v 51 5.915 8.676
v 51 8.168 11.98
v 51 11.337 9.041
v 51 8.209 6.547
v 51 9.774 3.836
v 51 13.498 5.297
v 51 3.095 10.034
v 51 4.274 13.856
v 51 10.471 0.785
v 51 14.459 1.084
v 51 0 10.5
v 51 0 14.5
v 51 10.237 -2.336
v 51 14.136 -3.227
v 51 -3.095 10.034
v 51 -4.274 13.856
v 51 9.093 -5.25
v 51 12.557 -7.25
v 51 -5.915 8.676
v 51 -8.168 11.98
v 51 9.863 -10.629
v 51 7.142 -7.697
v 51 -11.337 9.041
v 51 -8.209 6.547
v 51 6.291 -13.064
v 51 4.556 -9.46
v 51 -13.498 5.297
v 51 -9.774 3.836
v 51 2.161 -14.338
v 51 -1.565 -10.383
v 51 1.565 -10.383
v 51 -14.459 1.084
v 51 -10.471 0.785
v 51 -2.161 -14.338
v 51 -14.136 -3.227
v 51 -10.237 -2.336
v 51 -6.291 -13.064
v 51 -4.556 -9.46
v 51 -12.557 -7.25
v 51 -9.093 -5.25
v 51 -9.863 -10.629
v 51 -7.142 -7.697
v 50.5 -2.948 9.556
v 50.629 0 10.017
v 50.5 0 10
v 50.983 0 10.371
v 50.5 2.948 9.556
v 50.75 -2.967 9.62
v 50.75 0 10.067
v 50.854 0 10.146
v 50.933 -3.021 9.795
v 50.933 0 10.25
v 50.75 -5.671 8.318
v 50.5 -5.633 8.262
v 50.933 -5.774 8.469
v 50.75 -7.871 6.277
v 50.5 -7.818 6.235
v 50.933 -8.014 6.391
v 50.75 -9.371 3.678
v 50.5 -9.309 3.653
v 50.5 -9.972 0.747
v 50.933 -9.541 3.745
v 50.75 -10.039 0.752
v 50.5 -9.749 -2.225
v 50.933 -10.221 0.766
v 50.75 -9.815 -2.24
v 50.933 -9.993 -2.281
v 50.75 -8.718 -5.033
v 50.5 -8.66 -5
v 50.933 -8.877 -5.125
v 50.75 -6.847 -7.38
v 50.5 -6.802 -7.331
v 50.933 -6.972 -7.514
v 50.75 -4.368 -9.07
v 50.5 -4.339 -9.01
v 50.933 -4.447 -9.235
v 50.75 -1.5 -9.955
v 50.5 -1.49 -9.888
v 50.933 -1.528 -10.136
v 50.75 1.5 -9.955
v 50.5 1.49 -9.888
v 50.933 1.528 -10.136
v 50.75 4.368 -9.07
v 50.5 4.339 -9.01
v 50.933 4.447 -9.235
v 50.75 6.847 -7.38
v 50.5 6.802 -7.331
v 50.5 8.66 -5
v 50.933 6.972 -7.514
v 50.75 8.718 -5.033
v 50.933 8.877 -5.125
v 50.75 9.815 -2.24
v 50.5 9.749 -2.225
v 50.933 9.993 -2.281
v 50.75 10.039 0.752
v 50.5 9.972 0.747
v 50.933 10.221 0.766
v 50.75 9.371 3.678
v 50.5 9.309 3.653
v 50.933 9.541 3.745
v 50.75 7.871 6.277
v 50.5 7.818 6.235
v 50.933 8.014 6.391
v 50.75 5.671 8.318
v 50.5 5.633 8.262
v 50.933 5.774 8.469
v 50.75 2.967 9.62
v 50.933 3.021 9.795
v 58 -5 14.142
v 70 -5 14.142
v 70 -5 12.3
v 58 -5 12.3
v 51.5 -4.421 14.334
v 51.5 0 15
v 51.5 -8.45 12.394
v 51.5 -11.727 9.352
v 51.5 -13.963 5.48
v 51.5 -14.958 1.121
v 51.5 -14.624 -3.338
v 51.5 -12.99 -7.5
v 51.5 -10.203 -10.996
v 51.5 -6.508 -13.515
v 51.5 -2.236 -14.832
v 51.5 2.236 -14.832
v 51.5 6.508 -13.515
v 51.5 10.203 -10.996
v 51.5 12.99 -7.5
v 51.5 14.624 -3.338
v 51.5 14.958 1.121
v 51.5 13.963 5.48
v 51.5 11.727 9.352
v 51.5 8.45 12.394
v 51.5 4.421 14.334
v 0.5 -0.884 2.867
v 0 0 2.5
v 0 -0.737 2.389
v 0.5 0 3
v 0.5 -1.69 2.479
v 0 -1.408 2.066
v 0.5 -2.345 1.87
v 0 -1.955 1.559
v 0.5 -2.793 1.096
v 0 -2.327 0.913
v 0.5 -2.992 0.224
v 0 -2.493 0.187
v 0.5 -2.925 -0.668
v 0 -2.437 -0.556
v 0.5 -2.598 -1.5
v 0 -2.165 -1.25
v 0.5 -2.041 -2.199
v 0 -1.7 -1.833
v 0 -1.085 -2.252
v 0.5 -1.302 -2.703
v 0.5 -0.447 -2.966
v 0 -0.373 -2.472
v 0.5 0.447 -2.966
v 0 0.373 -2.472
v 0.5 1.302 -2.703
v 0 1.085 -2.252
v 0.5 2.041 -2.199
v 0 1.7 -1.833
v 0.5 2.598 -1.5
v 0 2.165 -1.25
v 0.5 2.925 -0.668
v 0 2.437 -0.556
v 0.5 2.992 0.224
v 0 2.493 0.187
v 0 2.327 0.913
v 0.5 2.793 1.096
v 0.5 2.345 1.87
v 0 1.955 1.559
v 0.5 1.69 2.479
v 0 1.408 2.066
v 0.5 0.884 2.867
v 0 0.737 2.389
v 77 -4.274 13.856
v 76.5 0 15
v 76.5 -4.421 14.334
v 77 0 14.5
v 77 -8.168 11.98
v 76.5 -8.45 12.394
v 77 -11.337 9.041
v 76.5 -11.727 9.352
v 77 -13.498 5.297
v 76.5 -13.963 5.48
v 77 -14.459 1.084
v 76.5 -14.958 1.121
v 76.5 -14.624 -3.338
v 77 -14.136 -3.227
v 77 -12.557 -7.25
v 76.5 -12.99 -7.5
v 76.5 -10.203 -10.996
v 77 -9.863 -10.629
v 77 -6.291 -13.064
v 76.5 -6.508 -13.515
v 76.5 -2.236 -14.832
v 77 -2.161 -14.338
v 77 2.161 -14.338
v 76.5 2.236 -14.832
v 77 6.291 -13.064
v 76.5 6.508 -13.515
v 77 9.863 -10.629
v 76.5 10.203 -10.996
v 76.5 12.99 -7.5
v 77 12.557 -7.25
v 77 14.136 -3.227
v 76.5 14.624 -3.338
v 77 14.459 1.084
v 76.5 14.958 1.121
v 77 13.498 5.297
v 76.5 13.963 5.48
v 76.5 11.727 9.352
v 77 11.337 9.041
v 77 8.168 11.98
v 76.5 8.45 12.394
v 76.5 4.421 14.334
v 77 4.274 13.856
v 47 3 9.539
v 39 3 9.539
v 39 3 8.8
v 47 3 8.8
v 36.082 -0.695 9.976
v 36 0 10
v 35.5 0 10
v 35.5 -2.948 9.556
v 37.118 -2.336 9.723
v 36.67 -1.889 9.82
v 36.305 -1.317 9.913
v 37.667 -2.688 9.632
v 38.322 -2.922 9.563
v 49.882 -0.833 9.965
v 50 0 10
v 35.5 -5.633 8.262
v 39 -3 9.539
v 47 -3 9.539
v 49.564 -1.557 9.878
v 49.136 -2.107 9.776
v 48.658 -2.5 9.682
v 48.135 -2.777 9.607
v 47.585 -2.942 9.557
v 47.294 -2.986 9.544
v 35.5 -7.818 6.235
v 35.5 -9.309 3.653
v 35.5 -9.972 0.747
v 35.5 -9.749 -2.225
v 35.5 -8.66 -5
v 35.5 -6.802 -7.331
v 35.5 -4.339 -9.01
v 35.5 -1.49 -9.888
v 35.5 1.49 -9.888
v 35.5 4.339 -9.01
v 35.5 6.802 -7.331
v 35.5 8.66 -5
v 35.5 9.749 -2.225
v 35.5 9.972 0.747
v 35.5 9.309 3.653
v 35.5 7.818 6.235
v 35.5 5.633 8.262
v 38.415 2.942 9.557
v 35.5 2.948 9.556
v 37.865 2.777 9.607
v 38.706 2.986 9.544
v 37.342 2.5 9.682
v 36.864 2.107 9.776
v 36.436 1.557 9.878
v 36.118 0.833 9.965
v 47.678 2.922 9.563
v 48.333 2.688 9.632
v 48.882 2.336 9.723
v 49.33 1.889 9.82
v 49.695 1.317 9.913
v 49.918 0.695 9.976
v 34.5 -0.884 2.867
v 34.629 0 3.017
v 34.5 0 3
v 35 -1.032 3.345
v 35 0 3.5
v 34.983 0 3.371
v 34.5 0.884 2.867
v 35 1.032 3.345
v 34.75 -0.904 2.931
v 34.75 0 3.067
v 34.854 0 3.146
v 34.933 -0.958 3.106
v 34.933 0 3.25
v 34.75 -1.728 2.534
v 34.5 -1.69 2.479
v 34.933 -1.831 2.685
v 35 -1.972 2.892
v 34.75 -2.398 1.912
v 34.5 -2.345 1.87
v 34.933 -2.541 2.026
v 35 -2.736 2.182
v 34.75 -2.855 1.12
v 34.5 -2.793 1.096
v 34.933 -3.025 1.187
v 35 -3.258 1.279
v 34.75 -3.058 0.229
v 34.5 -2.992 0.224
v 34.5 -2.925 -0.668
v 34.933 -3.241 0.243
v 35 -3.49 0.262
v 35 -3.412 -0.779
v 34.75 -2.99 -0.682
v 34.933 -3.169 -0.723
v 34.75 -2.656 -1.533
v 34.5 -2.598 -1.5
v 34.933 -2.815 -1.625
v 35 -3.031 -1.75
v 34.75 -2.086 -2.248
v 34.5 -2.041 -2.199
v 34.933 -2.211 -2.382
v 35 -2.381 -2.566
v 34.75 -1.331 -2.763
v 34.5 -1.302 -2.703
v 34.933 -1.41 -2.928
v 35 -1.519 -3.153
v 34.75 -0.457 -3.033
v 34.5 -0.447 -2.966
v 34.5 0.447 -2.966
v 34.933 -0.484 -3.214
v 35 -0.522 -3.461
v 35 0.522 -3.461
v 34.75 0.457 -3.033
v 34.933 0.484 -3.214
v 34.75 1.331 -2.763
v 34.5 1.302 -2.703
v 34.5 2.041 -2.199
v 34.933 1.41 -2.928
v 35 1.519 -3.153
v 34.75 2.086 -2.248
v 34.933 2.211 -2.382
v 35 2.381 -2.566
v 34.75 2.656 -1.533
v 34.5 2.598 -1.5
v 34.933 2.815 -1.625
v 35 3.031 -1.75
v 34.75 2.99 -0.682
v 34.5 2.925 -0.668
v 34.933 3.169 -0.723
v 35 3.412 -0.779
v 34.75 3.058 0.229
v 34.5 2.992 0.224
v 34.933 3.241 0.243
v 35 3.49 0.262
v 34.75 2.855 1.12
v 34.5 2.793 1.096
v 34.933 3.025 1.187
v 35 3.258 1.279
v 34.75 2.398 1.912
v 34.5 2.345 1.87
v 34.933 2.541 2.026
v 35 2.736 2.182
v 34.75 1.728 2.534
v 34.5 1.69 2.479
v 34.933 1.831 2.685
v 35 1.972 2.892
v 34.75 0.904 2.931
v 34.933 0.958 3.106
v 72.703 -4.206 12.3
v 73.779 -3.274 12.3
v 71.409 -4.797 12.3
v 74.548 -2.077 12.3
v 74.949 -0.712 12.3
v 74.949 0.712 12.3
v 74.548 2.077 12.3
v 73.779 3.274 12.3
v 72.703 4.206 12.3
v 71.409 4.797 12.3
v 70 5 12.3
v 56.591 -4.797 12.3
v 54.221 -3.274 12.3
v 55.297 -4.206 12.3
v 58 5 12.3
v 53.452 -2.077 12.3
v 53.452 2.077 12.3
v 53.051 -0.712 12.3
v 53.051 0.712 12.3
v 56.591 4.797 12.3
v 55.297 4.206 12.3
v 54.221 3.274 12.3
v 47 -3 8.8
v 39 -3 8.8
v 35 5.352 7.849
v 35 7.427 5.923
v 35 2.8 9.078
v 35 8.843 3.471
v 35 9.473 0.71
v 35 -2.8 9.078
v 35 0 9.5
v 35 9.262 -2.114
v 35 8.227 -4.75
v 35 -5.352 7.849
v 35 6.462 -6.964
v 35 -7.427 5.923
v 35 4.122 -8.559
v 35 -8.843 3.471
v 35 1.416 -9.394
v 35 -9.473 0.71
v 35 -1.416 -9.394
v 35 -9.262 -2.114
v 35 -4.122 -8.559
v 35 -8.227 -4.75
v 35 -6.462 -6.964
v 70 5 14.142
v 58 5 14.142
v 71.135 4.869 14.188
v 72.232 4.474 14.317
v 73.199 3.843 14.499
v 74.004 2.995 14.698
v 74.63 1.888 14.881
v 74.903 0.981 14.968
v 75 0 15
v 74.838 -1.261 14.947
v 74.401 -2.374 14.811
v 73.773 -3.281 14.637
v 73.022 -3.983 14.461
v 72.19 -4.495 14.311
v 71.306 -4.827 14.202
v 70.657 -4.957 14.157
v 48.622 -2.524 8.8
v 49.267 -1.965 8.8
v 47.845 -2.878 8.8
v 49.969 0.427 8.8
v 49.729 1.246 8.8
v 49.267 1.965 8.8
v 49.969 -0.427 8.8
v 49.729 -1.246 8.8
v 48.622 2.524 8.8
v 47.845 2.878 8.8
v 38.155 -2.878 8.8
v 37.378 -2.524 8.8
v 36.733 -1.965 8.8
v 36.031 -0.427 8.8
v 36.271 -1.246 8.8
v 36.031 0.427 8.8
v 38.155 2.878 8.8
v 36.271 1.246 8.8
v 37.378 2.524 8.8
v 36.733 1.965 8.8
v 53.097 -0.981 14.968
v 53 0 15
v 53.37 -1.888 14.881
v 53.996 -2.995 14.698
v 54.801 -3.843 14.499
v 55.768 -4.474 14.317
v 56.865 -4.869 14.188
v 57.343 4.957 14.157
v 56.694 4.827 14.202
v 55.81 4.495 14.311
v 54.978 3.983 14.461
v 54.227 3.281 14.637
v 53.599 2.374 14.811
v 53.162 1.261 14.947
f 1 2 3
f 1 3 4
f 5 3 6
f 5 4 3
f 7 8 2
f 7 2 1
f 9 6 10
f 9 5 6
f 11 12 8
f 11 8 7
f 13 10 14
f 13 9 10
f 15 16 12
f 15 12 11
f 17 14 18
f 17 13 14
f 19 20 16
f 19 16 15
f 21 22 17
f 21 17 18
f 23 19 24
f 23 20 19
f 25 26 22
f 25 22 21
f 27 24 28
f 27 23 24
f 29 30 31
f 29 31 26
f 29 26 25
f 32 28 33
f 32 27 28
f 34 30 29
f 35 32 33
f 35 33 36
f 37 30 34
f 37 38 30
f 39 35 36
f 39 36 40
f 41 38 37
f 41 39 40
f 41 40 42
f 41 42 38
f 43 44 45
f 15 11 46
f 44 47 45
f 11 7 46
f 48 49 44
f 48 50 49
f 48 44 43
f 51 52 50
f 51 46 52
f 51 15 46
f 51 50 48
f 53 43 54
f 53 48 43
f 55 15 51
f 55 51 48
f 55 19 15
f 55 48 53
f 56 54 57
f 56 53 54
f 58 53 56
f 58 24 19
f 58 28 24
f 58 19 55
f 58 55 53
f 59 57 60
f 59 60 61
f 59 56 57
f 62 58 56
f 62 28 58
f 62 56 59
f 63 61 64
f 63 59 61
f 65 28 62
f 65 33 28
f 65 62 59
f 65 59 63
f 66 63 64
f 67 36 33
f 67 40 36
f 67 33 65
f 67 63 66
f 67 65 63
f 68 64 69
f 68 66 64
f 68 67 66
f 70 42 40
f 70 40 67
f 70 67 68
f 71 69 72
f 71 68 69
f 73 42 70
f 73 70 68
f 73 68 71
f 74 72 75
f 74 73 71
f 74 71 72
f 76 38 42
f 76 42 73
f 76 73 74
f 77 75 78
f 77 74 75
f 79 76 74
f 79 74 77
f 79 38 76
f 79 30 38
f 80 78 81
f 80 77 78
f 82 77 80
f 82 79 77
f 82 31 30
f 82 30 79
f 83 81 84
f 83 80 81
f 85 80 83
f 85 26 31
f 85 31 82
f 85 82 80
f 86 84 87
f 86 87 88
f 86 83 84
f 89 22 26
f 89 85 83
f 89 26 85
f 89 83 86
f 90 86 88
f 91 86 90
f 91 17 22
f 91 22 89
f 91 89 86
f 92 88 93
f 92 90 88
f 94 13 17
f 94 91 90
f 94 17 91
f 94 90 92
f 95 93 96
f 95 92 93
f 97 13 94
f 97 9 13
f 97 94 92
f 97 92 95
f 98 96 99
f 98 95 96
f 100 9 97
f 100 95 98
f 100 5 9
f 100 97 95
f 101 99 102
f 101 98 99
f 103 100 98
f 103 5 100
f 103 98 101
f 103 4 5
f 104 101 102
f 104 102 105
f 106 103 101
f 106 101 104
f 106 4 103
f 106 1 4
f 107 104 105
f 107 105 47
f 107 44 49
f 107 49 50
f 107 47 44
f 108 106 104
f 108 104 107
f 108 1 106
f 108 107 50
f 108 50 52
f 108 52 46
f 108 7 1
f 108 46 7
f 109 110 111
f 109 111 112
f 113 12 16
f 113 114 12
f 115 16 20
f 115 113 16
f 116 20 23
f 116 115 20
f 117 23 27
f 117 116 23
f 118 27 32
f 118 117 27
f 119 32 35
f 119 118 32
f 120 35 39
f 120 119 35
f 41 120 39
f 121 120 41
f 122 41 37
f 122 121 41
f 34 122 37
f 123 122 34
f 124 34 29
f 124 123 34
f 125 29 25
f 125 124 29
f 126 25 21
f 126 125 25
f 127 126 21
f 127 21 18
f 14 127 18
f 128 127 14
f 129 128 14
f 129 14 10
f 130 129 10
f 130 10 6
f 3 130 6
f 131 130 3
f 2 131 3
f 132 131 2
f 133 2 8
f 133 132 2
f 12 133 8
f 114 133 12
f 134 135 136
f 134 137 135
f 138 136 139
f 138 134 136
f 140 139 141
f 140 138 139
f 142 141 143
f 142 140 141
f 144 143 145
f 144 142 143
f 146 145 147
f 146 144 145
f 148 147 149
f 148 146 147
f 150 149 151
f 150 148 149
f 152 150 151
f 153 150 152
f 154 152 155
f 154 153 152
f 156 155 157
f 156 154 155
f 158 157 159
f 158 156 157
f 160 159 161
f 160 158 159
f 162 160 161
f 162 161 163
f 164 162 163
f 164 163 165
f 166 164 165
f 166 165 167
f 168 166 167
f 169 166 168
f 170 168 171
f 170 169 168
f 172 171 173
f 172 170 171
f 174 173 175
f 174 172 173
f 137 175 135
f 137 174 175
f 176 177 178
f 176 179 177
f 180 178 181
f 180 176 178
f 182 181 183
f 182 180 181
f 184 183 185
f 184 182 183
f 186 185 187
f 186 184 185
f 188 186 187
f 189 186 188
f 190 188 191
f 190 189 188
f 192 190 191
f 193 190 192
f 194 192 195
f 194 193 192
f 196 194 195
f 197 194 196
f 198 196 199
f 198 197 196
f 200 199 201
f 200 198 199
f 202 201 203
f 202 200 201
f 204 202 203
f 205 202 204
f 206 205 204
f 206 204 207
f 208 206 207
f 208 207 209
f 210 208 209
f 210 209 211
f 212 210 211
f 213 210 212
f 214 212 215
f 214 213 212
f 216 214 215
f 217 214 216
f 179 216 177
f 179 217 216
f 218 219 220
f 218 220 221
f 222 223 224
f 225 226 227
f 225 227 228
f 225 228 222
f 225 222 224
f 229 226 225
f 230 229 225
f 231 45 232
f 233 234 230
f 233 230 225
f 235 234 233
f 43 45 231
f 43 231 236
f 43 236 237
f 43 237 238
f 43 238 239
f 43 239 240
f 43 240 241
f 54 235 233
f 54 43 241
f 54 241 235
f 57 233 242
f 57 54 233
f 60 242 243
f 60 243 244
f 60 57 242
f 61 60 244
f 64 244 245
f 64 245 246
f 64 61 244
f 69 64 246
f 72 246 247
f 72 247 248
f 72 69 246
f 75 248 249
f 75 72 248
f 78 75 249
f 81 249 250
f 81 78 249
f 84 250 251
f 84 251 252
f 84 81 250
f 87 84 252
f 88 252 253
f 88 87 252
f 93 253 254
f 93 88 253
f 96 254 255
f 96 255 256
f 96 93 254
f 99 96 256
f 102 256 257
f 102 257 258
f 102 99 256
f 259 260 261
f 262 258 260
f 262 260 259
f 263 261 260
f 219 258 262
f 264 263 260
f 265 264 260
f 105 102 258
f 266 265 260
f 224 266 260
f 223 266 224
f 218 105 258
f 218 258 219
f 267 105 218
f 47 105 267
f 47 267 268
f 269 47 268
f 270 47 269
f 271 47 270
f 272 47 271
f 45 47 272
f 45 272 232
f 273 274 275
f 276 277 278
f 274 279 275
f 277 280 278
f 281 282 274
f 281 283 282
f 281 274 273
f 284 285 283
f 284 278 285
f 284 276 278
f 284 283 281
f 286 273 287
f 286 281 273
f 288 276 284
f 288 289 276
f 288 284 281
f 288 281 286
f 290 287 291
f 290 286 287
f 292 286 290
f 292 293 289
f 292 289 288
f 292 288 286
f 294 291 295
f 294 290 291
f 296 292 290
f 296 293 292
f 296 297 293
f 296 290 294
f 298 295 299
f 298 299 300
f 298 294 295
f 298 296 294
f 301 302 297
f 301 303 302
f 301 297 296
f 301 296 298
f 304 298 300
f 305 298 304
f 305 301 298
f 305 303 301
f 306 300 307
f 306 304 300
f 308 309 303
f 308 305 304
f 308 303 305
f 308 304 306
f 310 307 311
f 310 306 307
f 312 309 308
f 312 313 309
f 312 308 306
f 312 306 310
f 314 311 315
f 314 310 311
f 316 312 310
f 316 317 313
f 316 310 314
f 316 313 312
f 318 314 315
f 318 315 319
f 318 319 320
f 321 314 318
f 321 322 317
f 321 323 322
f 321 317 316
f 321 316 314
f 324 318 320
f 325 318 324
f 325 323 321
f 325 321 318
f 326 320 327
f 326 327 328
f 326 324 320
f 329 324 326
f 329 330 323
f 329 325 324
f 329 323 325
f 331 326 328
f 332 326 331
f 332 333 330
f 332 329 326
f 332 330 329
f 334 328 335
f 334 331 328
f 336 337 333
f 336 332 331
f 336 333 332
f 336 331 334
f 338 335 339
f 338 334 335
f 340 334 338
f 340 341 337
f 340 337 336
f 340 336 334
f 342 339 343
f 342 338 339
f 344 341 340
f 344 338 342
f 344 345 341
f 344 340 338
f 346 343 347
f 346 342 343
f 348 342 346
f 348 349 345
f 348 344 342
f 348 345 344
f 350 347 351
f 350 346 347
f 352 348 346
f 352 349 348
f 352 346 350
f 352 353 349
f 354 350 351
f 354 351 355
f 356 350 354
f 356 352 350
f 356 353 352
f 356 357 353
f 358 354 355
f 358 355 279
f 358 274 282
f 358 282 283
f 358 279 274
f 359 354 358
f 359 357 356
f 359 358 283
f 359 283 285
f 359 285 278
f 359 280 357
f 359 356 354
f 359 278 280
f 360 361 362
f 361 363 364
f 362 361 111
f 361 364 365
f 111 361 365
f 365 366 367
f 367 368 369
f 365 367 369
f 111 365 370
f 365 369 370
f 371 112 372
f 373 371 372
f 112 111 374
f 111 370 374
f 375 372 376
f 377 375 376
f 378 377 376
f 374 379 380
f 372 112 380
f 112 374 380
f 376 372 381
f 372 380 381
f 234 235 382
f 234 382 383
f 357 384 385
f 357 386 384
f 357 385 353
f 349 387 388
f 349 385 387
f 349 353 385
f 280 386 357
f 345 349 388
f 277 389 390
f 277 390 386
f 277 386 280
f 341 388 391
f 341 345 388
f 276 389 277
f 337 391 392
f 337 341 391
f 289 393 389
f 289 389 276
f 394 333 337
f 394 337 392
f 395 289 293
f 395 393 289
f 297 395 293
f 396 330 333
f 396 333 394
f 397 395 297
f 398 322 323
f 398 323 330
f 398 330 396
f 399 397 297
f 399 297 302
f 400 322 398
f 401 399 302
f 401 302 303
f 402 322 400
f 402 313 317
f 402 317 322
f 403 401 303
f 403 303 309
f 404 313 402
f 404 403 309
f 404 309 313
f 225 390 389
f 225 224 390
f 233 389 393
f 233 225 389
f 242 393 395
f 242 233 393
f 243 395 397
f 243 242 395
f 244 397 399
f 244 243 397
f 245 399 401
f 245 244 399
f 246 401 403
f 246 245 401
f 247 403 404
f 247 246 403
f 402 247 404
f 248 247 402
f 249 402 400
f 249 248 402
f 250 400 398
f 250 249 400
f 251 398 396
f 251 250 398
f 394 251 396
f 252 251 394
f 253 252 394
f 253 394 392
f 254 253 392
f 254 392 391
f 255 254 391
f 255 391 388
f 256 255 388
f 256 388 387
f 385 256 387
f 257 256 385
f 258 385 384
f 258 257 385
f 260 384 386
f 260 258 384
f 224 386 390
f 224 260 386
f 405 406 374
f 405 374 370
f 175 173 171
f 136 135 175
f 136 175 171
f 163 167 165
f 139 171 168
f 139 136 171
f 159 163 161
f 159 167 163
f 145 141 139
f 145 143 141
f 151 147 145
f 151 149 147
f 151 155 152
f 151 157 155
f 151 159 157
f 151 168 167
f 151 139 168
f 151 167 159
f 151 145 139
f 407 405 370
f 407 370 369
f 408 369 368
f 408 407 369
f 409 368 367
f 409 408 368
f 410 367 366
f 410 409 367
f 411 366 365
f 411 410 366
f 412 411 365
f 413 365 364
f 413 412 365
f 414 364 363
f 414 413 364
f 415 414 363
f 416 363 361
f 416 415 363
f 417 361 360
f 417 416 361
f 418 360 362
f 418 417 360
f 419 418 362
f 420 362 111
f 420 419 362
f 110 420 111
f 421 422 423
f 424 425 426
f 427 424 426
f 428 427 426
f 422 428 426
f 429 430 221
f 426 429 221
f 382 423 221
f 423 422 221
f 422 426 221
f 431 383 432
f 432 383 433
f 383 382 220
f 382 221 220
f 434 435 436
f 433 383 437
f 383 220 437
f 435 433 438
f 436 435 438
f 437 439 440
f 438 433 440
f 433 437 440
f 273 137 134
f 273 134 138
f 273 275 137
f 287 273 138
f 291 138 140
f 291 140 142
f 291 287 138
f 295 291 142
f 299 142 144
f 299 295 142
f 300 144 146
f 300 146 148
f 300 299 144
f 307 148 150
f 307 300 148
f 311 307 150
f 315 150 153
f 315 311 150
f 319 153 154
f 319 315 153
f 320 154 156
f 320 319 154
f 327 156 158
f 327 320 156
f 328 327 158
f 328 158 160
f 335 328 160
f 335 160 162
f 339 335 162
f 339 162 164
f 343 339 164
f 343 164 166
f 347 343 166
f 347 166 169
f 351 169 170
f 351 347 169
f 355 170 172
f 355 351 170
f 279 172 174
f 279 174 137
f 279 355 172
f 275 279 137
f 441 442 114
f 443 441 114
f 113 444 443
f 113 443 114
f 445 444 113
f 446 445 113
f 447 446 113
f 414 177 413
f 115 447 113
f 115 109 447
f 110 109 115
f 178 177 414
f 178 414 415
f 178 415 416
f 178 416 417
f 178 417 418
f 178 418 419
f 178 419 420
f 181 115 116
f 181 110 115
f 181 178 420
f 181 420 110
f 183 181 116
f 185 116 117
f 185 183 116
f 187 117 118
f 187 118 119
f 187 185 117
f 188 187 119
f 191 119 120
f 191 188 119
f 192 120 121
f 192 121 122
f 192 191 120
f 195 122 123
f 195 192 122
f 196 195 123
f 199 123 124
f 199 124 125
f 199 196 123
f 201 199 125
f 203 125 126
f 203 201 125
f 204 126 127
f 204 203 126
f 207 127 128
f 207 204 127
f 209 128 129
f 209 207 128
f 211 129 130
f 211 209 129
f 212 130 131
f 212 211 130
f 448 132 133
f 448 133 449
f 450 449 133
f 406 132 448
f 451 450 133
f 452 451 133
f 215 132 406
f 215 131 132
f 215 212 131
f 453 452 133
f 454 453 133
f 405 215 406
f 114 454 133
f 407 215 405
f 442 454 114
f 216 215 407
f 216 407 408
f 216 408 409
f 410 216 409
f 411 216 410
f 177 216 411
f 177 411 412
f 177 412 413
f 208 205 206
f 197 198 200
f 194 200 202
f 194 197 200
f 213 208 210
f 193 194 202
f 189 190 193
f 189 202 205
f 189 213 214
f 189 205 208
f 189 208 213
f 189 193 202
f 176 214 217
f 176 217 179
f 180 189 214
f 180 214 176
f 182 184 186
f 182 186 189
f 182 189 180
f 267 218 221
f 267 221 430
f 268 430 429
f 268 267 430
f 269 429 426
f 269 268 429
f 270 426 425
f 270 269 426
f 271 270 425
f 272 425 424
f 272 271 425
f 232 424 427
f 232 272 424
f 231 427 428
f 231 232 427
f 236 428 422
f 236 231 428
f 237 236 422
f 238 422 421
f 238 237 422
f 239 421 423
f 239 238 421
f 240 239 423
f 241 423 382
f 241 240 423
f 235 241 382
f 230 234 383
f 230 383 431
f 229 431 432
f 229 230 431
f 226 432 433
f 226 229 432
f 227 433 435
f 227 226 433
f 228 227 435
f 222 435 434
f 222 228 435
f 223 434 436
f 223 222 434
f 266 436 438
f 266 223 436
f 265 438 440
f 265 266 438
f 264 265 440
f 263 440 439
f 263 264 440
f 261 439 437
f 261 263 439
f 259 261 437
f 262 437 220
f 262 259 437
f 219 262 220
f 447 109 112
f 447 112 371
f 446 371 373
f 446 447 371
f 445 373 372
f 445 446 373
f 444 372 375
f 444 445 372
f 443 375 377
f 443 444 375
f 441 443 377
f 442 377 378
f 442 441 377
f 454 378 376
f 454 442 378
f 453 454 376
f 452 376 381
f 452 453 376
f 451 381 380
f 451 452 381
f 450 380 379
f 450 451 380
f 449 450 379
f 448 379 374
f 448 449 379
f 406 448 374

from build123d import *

# Parameters (mm, degrees)
CUT_EXTRUDE_1_DEPTH = 1.2
CUT_EXTRUDE_2_DEPTH = 2.7


with BuildPart() as part:
    # Эскиз1 → Повернуть1 (revolve)
    with BuildSketch(Plane.XY):
        with BuildLine():
            Line((0, 0), (0, 2.5))
            Line((0, 2.5), (0.5, 3))
            Line((0.5, 3), (34.5, 3))
            ThreePointArc((34.5, 3), (34.853553391, 3.146446609), (35, 3.5))
            Line((35, 3.5), (35, 9.5))
            Line((35, 9.5), (35.5, 10))
            Line((35.5, 10), (50.5, 10))
            ThreePointArc((50.5, 10), (50.853553391, 10.146446609), (51, 10.5))
            Line((51, 10.5), (51, 14.5))
            Line((51, 14.5), (51.5, 15))
            Line((51.5, 15), (76.5, 15))
            Line((76.5, 15), (77, 14.5))
            Line((77, 14.5), (77, 0))
            Line((77, 0), (0, 0))
        make_face()
    revolve(axis=Axis((0, 0, 0), (1, 0, 0)))

    # Эскиз3 → Вырез-Вытянуть1 (cut)
    with BuildSketch(Plane.XY.offset(10)):
        with BuildLine():
            Line((39, 3), (47, 3))
            ThreePointArc((47, 3), (50, 0), (47, -3))
            Line((47, -3), (39, -3))
            ThreePointArc((39, -3), (36, 0), (39, 3))
        make_face()
    extrude(amount=-CUT_EXTRUDE_1_DEPTH, mode=Mode.SUBTRACT)

    # Эскиз4 → Вырез-Вытянуть2 (cut)
    with BuildSketch(Plane.XY.offset(15)):
        with BuildLine():
            Line((58, 5), (70, 5))
            ThreePointArc((70, 5), (75, 0), (70, -5))
            Line((70, -5), (58, -5))
            ThreePointArc((58, -5), (53, 0), (58, 5))
        make_face()
    extrude(amount=-CUT_EXTRUDE_2_DEPTH, mode=Mode.SUBTRACT)


solid = part.part
